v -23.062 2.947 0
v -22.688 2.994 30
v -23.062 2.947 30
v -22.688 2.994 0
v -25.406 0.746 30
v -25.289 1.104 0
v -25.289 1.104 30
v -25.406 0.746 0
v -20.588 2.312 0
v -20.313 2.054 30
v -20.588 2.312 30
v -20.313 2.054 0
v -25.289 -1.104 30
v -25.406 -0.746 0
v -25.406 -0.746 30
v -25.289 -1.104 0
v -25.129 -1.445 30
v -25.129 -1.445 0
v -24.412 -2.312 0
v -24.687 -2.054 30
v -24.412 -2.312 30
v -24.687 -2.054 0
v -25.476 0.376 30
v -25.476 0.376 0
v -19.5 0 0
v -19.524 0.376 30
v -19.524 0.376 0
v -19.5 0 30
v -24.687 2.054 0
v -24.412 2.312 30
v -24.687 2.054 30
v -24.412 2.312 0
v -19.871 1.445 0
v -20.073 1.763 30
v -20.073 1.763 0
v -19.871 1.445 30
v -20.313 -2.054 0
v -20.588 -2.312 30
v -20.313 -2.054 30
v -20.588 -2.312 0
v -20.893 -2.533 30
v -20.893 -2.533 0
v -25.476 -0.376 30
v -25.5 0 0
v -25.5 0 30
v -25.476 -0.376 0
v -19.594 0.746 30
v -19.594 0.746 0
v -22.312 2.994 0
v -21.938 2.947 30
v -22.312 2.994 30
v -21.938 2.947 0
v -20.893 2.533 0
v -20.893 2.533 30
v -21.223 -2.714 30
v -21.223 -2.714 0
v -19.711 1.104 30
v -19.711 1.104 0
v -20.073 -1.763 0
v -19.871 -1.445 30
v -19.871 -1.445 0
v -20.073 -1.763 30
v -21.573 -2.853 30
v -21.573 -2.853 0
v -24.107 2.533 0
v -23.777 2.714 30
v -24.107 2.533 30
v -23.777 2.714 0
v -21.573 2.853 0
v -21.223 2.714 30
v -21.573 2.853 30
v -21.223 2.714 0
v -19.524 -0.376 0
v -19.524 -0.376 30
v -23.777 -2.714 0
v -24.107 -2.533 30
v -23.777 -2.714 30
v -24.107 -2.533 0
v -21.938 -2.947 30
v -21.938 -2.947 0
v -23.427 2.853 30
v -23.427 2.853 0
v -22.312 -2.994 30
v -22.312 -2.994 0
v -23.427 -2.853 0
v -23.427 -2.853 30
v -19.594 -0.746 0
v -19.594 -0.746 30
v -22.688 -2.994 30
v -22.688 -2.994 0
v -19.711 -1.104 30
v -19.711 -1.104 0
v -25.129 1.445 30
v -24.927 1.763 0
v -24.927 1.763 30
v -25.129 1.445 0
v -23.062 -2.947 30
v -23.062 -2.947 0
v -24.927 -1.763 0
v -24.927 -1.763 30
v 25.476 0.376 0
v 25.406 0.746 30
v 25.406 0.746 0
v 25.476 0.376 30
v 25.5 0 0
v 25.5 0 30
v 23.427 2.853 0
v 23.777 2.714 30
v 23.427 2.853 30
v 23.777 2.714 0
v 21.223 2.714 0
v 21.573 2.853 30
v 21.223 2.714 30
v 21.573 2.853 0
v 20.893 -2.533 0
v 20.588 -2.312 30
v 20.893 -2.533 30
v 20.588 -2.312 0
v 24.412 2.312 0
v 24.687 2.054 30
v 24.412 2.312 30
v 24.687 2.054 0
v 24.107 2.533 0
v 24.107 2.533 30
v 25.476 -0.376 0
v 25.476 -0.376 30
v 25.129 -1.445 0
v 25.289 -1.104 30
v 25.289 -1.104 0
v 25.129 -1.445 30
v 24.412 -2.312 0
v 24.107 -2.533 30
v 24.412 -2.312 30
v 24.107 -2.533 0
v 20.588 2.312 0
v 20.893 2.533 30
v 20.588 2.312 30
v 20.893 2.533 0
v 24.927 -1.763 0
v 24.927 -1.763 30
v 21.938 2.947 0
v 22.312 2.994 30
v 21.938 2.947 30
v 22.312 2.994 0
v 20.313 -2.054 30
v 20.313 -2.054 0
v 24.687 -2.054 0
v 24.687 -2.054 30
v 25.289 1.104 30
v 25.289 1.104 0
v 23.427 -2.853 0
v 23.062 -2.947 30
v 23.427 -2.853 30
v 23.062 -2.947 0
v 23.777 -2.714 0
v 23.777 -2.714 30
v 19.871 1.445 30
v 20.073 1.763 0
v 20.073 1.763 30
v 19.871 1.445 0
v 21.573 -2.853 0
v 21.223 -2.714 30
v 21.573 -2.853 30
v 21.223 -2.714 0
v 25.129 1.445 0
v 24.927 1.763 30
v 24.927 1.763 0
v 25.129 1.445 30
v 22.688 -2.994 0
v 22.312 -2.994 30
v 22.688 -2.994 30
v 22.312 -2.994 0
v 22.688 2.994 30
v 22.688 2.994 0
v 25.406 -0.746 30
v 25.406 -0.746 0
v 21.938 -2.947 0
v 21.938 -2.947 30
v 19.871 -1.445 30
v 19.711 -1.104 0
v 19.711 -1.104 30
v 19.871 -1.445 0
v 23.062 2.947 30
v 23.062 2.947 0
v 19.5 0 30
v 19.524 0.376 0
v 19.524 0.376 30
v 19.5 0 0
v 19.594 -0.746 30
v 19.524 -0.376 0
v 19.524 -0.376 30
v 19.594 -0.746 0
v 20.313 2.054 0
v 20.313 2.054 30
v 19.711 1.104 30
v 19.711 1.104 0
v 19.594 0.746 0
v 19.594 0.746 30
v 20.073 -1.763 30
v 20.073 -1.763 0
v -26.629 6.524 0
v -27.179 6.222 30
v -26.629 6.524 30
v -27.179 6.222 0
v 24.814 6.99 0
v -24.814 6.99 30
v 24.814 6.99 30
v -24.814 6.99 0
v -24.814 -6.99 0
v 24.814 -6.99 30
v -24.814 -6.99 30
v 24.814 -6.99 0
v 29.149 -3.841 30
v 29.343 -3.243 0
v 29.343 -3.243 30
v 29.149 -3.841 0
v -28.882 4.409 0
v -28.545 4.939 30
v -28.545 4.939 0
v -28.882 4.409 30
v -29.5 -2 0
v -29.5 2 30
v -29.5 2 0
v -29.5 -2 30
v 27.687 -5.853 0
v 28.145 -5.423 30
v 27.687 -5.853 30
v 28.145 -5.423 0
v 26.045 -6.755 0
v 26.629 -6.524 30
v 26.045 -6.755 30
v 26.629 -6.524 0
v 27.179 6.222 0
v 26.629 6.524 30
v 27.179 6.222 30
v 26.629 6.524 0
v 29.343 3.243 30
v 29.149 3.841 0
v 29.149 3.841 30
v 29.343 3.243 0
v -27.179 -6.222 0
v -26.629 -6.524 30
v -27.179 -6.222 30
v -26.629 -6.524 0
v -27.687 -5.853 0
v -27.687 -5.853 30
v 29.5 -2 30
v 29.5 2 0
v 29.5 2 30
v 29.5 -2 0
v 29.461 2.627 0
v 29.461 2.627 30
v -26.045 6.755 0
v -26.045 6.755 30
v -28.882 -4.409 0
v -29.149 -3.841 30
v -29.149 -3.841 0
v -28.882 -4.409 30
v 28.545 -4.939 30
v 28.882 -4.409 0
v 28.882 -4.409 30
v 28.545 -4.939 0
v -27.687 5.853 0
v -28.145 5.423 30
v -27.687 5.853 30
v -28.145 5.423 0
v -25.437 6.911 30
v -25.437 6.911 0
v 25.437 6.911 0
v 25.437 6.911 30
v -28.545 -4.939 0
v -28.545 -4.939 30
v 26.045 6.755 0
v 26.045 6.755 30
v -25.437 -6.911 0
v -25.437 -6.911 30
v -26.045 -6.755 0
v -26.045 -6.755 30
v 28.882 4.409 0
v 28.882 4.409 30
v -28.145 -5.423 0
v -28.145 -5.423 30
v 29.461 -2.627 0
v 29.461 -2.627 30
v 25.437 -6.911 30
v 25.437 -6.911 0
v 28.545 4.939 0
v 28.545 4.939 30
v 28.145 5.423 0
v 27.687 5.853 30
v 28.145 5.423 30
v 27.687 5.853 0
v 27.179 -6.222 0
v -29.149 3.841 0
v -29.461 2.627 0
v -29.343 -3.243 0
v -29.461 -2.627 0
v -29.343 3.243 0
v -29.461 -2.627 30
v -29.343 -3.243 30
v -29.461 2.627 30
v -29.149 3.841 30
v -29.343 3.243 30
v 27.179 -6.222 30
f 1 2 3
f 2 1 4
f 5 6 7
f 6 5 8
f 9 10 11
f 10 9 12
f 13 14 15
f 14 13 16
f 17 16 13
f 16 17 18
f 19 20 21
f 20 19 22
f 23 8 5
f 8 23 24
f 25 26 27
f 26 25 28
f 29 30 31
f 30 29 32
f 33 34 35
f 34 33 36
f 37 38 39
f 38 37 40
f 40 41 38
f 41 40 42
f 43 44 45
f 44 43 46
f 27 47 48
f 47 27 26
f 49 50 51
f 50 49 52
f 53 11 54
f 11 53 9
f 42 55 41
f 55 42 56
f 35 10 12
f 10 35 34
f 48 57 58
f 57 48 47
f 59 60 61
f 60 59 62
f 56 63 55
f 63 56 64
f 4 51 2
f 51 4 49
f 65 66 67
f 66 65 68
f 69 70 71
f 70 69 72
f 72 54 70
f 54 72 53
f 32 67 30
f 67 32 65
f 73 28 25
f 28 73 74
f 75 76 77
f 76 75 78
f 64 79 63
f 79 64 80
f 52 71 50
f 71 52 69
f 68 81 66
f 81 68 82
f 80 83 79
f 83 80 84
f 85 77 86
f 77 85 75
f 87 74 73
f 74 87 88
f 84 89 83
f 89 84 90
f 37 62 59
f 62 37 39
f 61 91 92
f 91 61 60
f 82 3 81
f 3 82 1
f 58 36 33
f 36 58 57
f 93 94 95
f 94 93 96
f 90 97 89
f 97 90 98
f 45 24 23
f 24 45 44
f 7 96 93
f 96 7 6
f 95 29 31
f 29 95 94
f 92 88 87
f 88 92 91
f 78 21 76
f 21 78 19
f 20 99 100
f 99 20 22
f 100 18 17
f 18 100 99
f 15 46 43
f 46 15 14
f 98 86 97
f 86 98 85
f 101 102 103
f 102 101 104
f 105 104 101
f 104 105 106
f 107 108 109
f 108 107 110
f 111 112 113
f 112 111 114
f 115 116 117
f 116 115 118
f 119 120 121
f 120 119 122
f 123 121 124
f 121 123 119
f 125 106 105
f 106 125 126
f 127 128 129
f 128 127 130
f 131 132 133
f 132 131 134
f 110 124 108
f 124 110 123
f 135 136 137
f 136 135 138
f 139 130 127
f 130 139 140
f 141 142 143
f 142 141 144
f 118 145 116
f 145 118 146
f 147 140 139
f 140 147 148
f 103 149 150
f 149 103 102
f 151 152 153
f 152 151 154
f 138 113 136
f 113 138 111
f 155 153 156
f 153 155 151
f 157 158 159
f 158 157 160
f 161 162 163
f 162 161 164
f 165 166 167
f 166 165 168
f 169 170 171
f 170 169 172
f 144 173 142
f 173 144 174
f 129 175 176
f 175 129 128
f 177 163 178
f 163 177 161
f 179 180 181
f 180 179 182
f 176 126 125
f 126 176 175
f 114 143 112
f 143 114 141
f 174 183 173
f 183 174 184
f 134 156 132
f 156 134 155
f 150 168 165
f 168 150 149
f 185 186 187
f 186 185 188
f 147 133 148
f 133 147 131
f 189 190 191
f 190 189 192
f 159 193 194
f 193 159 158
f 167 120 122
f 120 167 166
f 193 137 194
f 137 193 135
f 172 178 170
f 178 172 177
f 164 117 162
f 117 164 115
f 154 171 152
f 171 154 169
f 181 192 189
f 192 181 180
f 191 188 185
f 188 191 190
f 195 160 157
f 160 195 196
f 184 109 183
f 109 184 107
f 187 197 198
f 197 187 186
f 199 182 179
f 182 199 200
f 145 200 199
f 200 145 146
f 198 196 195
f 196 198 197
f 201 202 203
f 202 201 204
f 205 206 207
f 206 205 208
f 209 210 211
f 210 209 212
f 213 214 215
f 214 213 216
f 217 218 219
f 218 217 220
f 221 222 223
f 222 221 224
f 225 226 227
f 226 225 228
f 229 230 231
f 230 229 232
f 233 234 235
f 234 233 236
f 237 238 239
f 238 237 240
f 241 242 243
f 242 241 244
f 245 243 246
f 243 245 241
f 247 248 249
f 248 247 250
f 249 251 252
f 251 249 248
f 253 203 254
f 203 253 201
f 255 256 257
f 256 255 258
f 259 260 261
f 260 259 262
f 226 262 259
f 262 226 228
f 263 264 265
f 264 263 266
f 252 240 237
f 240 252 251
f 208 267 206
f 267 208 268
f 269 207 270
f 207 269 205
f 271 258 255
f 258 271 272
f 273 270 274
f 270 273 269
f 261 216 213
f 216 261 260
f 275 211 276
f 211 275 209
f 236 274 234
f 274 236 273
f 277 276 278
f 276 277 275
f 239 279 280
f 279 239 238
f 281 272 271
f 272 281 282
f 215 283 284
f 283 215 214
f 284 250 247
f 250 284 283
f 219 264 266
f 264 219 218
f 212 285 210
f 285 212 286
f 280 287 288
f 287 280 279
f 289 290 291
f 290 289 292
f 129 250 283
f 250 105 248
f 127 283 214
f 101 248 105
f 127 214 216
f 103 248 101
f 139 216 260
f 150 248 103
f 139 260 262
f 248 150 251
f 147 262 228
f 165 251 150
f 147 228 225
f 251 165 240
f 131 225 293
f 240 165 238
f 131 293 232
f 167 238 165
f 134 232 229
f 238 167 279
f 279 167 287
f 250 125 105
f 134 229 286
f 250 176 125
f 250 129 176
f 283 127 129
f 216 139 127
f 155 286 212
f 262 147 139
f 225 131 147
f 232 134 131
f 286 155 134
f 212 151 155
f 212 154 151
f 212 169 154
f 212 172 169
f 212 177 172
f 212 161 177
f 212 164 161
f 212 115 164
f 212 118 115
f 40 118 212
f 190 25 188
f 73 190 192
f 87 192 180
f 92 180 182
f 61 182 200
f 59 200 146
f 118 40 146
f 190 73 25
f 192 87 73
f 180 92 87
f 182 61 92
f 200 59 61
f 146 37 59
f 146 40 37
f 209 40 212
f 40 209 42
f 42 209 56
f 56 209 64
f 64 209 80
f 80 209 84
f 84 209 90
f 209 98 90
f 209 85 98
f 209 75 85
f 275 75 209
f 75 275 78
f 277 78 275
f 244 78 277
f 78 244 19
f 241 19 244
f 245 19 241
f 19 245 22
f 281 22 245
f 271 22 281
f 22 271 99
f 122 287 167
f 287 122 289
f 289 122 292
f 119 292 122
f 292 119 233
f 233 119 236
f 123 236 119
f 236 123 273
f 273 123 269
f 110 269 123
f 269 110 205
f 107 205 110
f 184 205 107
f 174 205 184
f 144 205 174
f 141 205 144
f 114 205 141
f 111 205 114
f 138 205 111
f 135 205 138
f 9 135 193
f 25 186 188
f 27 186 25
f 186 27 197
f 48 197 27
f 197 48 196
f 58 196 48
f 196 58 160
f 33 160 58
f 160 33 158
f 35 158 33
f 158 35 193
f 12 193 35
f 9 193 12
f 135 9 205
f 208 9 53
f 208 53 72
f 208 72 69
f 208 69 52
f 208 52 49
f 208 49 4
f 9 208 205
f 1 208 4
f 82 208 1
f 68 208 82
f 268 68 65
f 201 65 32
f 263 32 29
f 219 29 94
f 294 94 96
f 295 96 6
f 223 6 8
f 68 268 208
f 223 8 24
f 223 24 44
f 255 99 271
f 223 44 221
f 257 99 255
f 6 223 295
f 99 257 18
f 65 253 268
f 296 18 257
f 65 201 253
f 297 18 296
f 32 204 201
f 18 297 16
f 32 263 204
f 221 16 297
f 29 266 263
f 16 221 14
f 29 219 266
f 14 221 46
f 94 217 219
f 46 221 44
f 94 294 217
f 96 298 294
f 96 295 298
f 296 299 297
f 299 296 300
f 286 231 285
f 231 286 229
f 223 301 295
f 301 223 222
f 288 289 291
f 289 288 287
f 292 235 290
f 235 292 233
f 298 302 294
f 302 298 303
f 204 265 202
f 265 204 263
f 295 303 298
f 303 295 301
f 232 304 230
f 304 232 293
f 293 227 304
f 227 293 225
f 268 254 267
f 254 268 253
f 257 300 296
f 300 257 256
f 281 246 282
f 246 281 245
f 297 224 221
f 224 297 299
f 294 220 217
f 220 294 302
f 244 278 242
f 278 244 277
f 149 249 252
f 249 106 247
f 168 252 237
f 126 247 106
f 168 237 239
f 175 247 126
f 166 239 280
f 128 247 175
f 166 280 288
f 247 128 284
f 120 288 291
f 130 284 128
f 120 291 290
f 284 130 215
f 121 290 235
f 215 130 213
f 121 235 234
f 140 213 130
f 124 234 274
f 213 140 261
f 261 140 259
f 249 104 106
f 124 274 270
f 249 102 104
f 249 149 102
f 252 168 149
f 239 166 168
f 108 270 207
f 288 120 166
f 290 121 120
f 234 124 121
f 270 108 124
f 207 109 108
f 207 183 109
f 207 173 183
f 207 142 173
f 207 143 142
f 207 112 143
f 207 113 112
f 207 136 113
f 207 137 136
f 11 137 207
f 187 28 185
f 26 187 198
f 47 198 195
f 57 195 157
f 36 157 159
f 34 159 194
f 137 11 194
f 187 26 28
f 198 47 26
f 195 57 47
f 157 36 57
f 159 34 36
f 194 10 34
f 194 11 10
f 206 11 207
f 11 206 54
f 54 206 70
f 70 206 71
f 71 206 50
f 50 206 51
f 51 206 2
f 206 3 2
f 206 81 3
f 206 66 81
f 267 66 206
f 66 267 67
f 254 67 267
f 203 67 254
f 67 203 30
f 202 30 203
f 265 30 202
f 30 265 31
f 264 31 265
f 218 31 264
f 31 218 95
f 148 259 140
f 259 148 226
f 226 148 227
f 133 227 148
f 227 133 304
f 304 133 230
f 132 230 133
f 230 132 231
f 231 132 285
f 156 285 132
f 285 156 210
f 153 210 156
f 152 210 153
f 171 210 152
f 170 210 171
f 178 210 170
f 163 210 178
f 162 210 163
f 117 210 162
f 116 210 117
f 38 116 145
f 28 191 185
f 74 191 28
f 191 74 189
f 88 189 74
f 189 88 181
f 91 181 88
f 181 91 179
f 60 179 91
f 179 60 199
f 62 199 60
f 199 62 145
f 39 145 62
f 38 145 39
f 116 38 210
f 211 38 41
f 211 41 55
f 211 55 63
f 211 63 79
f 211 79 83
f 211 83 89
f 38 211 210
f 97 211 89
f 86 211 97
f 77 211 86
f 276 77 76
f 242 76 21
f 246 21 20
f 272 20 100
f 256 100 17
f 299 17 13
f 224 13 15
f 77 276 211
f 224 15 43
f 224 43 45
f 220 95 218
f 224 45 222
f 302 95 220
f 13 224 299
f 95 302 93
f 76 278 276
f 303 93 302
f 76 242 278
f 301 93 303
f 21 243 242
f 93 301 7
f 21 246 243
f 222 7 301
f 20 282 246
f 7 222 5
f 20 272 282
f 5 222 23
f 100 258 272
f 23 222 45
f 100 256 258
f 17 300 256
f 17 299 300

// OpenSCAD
$fn = 50;


difference() {
	union() {
		hull() {
			translate(v = [-24.5000000000, 2.0000000000, 0]) {
				cylinder(h = 30, r = 5);
			}
			translate(v = [24.5000000000, 2.0000000000, 0]) {
				cylinder(h = 30, r = 5);
			}
			translate(v = [-24.5000000000, -2.0000000000, 0]) {
				cylinder(h = 30, r = 5);
			}
			translate(v = [24.5000000000, -2.0000000000, 0]) {
				cylinder(h = 30, r = 5);
			}
		}
	}
	union() {
		translate(v = [-22.5000000000, 0.0000000000, -100.0000000000]) {
			cylinder(h = 200, r = 3.0000000000);
		}
		translate(v = [-22.5000000000, 0.0000000000, -100.0000000000]) {
			cylinder(h = 200, r = 3.0000000000);
		}
		translate(v = [22.5000000000, 0.0000000000, -100.0000000000]) {
			cylinder(h = 200, r = 3.0000000000);
		}
		translate(v = [22.5000000000, 0.0000000000, -100.0000000000]) {
			cylinder(h = 200, r = 3.0000000000);
		}
	}
}
